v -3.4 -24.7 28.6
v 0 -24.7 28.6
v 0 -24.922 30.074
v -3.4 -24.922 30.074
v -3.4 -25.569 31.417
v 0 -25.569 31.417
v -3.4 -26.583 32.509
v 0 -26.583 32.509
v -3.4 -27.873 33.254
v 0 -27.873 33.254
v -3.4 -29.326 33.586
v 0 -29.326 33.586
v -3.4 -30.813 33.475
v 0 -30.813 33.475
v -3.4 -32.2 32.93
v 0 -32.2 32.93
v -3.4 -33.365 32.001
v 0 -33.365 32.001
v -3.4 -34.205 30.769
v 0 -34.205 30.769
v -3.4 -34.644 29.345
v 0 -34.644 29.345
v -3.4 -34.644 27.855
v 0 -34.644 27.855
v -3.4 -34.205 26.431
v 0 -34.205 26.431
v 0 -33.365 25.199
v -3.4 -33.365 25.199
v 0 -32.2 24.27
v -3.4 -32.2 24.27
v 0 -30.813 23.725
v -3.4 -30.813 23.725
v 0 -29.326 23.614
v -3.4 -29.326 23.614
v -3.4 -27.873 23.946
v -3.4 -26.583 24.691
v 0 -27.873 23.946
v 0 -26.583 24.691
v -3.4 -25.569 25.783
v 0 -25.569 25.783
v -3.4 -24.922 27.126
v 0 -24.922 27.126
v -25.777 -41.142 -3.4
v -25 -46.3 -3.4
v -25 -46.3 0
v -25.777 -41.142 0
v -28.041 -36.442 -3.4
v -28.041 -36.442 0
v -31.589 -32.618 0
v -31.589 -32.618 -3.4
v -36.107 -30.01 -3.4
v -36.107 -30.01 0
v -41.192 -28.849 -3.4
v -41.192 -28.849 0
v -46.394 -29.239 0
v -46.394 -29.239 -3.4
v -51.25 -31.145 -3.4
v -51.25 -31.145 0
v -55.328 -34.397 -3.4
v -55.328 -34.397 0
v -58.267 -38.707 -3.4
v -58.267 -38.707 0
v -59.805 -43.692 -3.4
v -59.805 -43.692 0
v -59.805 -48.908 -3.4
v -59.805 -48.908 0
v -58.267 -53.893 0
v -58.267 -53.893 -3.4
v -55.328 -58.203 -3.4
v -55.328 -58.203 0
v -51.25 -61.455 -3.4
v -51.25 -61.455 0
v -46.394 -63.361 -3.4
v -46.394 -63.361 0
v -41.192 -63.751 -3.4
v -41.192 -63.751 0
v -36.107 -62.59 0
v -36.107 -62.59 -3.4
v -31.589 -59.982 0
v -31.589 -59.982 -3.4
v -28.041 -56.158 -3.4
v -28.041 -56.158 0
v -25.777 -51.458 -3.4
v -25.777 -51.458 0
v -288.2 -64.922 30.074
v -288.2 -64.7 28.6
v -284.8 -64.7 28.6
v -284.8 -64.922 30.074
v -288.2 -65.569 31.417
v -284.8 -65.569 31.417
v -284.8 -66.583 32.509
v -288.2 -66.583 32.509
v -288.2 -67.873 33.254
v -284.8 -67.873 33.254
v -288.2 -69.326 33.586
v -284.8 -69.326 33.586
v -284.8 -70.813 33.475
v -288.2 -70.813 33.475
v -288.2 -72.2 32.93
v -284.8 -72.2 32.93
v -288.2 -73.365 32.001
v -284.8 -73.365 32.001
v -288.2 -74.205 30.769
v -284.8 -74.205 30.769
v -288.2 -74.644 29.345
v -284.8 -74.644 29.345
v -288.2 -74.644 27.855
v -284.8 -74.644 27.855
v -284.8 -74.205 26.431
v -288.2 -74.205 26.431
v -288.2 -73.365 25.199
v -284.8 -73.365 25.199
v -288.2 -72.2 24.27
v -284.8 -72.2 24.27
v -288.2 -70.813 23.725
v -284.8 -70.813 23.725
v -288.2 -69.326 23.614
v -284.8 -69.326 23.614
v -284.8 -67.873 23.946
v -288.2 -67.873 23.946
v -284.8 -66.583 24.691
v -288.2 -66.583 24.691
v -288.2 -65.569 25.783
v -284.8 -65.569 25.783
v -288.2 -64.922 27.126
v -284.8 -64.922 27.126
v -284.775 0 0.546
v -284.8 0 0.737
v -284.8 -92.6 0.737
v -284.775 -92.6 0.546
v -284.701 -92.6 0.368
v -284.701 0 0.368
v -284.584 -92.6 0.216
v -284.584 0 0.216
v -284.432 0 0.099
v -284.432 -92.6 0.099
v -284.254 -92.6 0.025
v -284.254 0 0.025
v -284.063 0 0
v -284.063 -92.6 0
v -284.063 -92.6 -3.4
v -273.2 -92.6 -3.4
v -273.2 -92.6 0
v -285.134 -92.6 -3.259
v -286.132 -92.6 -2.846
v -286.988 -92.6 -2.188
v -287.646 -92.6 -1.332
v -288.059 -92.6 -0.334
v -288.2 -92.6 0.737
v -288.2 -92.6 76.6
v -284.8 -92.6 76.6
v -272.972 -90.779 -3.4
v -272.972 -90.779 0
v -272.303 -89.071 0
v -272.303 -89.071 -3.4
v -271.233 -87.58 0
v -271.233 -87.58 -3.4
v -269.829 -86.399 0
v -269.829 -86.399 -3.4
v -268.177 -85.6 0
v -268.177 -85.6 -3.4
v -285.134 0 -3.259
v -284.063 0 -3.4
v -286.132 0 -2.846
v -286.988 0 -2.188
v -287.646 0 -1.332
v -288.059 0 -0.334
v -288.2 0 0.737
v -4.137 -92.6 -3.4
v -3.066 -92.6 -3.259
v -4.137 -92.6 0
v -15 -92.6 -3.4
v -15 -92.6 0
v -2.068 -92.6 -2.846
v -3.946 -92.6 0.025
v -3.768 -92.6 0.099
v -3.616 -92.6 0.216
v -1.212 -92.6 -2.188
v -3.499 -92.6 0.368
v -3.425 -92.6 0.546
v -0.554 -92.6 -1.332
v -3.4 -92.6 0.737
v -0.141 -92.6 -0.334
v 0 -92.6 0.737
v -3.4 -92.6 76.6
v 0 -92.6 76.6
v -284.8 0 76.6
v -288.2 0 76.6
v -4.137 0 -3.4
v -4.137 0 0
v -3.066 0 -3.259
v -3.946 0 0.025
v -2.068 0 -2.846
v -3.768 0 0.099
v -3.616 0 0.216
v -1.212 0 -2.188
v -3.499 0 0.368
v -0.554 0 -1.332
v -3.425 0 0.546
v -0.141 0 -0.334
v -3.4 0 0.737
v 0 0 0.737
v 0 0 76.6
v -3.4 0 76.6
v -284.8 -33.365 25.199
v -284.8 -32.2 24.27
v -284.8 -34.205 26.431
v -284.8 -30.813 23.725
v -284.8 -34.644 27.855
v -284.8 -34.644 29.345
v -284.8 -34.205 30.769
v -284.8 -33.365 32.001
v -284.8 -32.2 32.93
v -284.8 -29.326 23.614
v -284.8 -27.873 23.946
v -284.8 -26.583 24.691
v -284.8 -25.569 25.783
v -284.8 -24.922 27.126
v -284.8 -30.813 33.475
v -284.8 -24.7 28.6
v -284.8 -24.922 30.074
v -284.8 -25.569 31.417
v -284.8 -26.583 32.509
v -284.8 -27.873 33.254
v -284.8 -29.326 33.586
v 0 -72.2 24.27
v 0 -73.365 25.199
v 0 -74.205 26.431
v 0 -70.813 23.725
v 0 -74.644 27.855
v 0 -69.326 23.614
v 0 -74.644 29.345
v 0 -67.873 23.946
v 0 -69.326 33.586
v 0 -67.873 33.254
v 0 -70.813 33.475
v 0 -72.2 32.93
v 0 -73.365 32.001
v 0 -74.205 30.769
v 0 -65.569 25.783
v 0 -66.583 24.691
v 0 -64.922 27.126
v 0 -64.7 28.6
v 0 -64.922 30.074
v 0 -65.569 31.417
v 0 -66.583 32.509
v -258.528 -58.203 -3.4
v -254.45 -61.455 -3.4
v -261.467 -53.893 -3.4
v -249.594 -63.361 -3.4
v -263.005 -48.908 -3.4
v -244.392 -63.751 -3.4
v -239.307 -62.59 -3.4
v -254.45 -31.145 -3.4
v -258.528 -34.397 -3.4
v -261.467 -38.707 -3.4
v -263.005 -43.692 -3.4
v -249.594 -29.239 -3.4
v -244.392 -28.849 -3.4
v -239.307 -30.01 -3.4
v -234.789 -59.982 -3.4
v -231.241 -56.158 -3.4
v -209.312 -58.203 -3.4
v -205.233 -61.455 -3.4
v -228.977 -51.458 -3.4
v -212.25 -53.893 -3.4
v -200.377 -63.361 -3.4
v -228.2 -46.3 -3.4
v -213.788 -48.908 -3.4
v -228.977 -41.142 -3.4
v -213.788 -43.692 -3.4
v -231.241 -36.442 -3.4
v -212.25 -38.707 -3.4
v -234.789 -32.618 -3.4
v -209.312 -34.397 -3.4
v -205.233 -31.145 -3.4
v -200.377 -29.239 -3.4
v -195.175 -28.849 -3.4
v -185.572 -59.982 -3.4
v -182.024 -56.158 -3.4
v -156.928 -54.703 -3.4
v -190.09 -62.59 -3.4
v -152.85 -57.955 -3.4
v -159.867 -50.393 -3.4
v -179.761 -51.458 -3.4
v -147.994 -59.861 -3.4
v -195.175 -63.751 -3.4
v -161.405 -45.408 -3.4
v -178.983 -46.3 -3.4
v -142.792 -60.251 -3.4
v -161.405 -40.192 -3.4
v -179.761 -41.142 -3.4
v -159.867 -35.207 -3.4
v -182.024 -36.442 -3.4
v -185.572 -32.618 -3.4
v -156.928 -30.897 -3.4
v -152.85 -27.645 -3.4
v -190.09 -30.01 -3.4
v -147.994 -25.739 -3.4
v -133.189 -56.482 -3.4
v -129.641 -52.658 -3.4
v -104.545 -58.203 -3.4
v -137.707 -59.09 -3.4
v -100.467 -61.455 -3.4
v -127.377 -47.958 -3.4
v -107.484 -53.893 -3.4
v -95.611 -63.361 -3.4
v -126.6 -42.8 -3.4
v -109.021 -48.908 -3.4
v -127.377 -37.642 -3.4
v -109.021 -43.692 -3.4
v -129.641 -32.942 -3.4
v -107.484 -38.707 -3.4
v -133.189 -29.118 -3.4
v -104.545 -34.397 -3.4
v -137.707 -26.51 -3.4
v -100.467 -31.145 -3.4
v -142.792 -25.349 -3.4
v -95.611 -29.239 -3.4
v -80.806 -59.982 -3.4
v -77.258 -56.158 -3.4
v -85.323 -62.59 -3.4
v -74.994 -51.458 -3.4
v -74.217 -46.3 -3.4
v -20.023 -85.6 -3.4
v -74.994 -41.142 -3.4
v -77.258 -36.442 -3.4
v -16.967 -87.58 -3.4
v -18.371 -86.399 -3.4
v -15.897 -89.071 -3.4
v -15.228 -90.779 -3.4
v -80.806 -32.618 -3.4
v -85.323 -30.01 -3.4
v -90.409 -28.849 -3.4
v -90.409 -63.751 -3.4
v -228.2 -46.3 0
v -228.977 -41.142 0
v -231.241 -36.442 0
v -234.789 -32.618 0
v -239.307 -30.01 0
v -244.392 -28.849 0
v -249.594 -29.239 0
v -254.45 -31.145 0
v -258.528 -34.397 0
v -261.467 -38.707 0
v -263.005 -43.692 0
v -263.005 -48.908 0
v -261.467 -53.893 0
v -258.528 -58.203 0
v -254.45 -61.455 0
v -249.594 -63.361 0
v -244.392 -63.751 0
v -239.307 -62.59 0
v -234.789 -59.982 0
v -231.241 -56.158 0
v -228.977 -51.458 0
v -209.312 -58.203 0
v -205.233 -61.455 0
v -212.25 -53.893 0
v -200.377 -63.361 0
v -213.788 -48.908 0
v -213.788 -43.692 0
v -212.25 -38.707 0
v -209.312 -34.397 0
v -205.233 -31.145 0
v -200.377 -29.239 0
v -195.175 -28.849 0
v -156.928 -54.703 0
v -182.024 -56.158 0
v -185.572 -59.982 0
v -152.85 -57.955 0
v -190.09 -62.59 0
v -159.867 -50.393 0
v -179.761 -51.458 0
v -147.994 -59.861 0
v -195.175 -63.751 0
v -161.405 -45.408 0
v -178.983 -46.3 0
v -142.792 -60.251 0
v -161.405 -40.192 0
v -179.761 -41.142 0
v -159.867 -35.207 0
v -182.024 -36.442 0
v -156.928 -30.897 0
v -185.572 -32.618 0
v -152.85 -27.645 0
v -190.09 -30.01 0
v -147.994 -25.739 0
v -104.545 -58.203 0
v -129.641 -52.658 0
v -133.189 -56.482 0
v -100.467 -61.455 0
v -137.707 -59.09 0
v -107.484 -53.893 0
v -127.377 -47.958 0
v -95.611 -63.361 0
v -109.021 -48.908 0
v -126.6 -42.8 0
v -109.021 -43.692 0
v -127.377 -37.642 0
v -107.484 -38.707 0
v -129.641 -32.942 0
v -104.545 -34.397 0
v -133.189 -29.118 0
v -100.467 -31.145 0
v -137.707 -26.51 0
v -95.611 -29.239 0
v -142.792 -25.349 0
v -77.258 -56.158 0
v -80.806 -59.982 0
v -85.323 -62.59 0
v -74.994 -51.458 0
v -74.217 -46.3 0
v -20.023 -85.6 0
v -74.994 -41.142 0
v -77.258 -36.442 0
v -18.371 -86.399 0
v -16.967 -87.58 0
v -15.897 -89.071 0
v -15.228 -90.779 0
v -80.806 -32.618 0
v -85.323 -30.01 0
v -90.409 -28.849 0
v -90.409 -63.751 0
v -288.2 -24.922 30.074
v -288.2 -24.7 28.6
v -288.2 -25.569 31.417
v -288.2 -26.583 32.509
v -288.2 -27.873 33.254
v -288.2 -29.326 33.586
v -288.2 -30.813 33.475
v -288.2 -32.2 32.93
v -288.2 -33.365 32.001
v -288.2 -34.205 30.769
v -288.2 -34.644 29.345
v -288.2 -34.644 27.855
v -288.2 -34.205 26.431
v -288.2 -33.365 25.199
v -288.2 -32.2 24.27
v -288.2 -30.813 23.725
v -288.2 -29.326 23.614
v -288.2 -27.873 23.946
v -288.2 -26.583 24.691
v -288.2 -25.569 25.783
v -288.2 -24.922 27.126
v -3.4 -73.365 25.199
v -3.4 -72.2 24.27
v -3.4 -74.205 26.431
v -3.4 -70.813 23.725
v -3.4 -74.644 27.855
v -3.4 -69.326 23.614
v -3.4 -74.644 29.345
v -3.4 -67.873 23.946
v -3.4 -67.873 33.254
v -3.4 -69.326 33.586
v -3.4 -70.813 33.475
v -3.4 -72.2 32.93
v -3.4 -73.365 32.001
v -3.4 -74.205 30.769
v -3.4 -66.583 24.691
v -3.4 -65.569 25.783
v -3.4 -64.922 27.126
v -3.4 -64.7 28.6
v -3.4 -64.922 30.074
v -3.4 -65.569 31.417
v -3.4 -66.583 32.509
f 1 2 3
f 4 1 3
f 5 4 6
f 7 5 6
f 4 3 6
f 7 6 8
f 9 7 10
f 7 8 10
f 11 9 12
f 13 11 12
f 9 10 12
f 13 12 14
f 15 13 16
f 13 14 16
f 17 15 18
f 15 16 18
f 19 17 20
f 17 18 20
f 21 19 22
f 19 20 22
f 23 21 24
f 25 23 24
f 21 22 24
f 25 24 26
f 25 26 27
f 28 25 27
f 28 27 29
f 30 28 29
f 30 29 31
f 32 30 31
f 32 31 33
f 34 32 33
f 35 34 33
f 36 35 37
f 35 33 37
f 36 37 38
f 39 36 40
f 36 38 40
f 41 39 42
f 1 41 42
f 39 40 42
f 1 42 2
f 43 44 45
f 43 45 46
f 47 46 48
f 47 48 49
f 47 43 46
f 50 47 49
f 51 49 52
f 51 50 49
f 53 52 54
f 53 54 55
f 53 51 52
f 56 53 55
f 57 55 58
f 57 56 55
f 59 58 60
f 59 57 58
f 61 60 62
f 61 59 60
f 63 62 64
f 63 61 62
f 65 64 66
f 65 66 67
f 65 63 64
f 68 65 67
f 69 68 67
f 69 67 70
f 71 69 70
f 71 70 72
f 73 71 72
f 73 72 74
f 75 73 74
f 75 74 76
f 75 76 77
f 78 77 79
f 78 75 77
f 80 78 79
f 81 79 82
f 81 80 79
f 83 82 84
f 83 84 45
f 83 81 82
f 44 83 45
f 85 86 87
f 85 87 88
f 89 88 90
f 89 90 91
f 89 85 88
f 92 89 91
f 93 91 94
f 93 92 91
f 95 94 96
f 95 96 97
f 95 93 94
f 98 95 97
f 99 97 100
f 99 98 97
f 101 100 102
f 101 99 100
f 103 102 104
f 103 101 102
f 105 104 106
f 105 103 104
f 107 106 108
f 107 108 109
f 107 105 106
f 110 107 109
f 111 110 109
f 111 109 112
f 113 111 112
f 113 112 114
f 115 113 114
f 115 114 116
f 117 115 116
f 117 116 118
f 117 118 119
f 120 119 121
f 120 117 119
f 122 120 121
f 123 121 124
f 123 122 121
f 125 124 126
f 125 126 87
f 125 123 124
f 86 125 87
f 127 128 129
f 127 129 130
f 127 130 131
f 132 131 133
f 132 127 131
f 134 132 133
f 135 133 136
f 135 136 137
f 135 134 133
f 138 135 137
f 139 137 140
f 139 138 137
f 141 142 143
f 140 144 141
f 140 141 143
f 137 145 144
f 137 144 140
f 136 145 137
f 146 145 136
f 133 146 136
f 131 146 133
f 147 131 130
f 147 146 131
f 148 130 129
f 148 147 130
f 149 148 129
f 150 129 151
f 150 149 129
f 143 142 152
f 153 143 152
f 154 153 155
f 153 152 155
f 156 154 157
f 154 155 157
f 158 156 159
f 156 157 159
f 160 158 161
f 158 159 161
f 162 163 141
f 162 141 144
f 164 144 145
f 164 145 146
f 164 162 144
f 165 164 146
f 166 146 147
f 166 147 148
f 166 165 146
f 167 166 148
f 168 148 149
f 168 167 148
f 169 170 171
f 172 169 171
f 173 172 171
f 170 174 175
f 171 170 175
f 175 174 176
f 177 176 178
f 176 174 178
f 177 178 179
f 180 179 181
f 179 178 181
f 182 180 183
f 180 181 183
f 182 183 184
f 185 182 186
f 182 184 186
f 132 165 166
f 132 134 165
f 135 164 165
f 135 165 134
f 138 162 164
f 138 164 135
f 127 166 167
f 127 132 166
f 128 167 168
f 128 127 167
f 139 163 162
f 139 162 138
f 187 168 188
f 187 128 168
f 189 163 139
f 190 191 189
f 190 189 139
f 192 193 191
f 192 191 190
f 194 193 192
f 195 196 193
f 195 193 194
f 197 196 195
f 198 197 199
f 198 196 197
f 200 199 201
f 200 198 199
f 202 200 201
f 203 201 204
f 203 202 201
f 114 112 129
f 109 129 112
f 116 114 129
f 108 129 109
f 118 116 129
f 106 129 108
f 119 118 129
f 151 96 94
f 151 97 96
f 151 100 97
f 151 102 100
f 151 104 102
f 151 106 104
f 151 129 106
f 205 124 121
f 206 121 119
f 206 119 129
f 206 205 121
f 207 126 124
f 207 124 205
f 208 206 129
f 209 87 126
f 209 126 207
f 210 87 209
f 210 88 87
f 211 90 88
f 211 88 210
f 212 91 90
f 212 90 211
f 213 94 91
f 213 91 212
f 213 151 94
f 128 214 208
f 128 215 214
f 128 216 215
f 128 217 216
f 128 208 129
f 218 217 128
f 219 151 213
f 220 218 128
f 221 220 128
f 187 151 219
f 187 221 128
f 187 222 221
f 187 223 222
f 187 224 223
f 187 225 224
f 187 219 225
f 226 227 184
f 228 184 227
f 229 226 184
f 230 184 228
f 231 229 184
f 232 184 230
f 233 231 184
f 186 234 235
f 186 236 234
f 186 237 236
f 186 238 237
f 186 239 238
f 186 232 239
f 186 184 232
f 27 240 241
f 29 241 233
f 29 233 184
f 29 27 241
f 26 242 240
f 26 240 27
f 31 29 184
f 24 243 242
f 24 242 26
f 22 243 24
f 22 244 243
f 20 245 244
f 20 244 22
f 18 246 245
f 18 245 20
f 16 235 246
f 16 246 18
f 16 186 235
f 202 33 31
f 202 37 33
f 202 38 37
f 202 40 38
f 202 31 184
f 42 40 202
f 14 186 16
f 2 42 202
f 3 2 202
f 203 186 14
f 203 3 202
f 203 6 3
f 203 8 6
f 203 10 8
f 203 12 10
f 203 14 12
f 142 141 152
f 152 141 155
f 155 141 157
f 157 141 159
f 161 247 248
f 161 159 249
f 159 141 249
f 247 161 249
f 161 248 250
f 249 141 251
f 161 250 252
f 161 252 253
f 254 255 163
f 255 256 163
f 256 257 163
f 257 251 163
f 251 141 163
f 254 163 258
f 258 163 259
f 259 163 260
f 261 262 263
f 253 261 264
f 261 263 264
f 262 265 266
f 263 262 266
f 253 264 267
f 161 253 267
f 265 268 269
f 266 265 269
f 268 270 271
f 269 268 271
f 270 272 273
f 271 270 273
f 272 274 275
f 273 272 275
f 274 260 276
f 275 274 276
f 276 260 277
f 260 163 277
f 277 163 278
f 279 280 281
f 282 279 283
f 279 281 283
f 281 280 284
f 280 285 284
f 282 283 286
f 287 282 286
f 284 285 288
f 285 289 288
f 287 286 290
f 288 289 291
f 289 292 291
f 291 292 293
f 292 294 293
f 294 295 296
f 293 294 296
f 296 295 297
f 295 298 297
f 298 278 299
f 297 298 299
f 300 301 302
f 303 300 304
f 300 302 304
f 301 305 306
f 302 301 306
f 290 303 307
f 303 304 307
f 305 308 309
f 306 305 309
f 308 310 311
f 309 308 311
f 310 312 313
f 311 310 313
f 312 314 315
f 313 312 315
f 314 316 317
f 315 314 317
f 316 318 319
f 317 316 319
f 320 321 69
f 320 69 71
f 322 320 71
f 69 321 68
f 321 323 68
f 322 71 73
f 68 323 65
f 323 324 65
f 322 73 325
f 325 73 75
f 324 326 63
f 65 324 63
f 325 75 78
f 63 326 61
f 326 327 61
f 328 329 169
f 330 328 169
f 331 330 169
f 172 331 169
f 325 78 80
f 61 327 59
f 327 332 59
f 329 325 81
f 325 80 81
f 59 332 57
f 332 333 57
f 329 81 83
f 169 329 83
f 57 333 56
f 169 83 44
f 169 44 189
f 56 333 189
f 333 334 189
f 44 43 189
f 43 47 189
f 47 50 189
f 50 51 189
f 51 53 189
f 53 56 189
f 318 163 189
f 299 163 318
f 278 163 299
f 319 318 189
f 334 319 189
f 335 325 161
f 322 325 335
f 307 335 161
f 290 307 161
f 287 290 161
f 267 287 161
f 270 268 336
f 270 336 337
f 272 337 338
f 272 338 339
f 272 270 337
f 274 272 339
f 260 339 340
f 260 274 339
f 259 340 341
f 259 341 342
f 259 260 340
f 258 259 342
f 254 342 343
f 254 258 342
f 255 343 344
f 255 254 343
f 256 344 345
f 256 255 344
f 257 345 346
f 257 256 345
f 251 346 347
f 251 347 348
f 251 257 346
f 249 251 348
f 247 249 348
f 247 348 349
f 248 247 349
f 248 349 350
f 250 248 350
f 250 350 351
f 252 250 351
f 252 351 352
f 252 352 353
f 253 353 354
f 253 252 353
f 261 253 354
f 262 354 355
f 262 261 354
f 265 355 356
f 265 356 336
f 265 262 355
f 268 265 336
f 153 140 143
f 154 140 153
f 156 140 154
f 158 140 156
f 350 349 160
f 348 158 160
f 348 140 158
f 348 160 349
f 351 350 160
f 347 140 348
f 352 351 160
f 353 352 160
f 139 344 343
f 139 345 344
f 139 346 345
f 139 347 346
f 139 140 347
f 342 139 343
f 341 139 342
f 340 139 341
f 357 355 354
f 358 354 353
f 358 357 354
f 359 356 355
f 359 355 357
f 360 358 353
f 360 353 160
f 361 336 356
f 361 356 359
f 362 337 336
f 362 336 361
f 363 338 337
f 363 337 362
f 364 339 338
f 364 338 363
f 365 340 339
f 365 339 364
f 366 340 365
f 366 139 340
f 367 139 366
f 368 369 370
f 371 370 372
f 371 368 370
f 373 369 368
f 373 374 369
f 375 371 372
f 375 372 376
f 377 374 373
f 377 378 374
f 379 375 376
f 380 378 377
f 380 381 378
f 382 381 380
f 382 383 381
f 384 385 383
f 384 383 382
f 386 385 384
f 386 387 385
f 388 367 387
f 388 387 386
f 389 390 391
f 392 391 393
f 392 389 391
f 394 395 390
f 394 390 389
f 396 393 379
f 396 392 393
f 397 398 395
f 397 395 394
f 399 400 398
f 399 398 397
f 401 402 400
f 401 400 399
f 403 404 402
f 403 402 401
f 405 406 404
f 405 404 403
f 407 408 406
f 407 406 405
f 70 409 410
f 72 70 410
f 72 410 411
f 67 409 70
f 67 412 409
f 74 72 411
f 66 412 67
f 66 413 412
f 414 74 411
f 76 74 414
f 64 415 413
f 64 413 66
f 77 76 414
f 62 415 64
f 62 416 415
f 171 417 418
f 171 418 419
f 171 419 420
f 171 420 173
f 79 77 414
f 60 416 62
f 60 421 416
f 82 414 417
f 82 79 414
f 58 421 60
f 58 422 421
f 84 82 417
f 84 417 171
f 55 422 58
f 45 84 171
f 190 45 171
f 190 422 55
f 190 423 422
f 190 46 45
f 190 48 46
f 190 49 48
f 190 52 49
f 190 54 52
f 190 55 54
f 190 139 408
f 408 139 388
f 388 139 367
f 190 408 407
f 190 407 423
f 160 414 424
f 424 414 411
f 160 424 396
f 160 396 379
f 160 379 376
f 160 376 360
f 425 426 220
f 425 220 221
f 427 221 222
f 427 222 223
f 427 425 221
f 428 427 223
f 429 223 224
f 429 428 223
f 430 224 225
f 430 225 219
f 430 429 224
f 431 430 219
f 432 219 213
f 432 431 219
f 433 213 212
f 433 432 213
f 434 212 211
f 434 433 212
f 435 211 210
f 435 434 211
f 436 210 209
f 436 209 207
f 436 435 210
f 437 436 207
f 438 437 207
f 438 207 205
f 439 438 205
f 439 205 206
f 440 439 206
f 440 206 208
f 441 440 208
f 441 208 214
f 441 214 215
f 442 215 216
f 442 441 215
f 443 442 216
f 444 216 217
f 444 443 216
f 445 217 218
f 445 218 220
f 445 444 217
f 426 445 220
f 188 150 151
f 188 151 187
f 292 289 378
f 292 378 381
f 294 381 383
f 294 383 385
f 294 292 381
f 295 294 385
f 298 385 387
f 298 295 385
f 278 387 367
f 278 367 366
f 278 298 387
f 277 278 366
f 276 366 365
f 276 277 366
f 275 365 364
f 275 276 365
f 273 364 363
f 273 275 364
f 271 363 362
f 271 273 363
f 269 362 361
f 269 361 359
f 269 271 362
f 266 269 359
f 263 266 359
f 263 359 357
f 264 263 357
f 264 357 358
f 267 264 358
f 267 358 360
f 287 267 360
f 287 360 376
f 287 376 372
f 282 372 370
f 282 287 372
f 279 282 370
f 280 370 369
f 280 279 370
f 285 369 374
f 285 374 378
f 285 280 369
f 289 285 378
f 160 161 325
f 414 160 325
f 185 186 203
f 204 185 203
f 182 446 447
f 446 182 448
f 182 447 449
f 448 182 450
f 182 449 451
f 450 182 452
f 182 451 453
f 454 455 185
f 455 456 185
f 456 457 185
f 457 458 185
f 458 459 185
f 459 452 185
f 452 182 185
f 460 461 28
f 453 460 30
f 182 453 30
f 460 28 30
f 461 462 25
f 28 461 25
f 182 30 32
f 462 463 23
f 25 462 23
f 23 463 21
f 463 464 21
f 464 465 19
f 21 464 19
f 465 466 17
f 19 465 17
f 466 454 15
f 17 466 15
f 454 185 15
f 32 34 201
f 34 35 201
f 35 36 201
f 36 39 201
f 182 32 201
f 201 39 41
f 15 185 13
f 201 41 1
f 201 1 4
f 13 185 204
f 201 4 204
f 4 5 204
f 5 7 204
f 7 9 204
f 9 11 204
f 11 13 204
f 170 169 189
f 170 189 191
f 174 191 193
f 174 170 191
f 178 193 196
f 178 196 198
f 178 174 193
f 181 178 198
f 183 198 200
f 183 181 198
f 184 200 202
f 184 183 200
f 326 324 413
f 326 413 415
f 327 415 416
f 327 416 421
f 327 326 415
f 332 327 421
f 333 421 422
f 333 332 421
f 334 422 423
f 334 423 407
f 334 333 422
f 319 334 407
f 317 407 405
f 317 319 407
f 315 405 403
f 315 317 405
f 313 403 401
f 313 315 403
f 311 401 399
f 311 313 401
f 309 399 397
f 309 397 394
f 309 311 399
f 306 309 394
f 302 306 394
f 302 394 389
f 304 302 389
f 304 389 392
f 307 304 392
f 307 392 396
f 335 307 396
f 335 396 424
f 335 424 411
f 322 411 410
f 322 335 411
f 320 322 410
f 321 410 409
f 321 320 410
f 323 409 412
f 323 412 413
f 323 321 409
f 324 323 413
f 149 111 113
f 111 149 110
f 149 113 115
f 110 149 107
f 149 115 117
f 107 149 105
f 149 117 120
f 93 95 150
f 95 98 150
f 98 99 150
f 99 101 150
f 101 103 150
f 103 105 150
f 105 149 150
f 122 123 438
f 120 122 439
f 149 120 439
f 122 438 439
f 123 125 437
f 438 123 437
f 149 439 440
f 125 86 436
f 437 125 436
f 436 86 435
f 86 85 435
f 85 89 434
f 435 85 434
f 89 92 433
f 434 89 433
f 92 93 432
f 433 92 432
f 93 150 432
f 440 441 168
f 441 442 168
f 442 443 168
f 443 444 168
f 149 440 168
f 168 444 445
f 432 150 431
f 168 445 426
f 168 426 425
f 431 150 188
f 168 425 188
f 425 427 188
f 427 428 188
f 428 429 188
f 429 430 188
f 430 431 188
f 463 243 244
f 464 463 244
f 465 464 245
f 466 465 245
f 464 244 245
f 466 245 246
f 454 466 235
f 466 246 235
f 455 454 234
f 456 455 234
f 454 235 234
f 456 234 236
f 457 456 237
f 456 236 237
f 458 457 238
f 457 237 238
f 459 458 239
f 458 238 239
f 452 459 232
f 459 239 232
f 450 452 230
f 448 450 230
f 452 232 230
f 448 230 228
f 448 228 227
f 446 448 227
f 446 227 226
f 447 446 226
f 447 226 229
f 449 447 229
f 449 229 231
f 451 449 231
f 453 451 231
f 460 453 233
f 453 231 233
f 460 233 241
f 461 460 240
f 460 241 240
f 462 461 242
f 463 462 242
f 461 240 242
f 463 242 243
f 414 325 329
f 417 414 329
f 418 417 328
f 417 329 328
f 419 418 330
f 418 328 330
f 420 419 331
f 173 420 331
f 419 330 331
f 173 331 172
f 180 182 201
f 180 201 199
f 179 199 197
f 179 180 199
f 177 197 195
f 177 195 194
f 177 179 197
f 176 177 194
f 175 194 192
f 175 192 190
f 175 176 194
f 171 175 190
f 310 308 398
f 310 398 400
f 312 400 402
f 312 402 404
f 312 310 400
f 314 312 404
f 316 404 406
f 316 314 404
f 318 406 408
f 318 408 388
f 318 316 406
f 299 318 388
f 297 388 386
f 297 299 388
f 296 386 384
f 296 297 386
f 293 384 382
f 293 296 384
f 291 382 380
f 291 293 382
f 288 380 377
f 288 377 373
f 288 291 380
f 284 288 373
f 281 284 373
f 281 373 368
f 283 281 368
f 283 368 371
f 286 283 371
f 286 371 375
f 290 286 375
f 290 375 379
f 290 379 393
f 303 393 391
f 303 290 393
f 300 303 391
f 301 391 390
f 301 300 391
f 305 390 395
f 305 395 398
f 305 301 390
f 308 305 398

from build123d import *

# Parameters (mm, degrees)
BASE_FLANGE1_START           = -3.4
BASE_FLANGE1_OUTLINE_R       = 17.5
BASE_FLANGE1_DEPTH           = 3.4
EDGE_FLANGE2_STRIP_W         = 15.0732
EDGE_FLANGE2_STRIP_H         = 3.4
EDGE_FLANGE2_STRIP_CUT_DEPTH = 92.6
EDGE_FLANGE2_DEPTH           = 92.6
EDGE_FLANGE2_PROFILE_W       = 92.6
EDGE_FLANGE2_PROFILE_H       = 75.8634
EDGE_FLANGE2_PROFILE_R       = 5
EDGE_FLANGE2_FLAT_DEPTH      = 3.4
EDGE_FLANGE3_STRIP_W         = 15.0732
EDGE_FLANGE3_STRIP_H         = 3.4
EDGE_FLANGE3_STRIP_CUT_DEPTH = 92.6
EDGE_FLANGE3_DEPTH           = 92.6
EDGE_FLANGE3_PROFILE_W       = 92.6
EDGE_FLANGE3_PROFILE_H       = 75.8634
EDGE_FLANGE3_PROFILE_R       = 5
EDGE_FLANGE3_FLAT_DEPTH      = 3.4


# Read off the part's stored shape, not the designer's step: Base-Flange1
# Sheet-metal steps are written as plain solids
with BuildPart() as part:
    # Base-Flange1 outline → Base-Flange1 (new body)
    with BuildSketch(Plane.XY.offset(BASE_FLANGE1_START)):
        with BuildLine():
            Line((0, -92.6), (0, 0))
            Line((0, 0), (-288.2, 0))
            Line((-288.2, 0), (-288.2, -92.6))
            Line((-288.2, -92.6), (-273.2, -92.6))
            ThreePointArc((-273.2, -92.6), (-271.814311921, -88.29213457), (-268.176971207, -85.6))
            Line((-268.176971207, -85.6), (-20.023028793, -85.6))
            ThreePointArc((-20.023028793, -85.6), (-16.385688079, -88.29213457), (-15, -92.6))
            Line((-15, -92.6), (0, -92.6))
        make_face()
        with Locations((-245.7, -46.3)):
            Circle(BASE_FLANGE1_OUTLINE_R, mode=Mode.SUBTRACT)
        with Locations((-196.483203415, -46.3)):
            Circle(BASE_FLANGE1_OUTLINE_R, mode=Mode.SUBTRACT)
        with Locations((-144.1, -42.8)):
            Circle(BASE_FLANGE1_OUTLINE_R, mode=Mode.SUBTRACT)
        with Locations((-91.716796585, -46.3)):
            Circle(BASE_FLANGE1_OUTLINE_R, mode=Mode.SUBTRACT)
        with Locations((-42.5, -46.3)):
            Circle(BASE_FLANGE1_OUTLINE_R, mode=Mode.SUBTRACT)
    extrude(amount=BASE_FLANGE1_DEPTH)

    # Edge-Flange2 strip (across the edge) → Edge-Flange2 strip cut (cut)
    with BuildSketch(Plane(origin=(-288.2, 0, 0), x_dir=(1, 0, 0), z_dir=(0, -1, 0))):
        with Locations((-3.4, -1.7)):
            Rectangle(EDGE_FLANGE2_STRIP_W, EDGE_FLANGE2_STRIP_H)
    extrude(amount=EDGE_FLANGE2_STRIP_CUT_DEPTH, mode=Mode.SUBTRACT)

    # Edge-Flange2 bend section (across the edge) → Edge-Flange2 (add)
    with BuildSketch(Plane(origin=(-288.2, 0, 0), x_dir=(1, 0, 0), z_dir=(0, -1, 0))):
        with BuildLine():
            Line((0, 0.7366), (3.4, 0.7366))
            ThreePointArc((3.4, 0.7366), (3.615745145, 0.215745145), (4.1366, 0))
            Line((4.1366, 0), (4.1366, -3.4))
            ThreePointArc((4.1366, -3.4), (1.211582089, -2.188417911), (0, 0.7366))
        make_face()
    extrude(amount=EDGE_FLANGE2_DEPTH)

    # Edge-Flange2 profile (on flange) → Edge-Flange2 flat (add)
    with BuildSketch(Plane.YZ.offset(-288.2)):
        with Locations((-46.3, 38.6683)):
            Rectangle(EDGE_FLANGE2_PROFILE_W, EDGE_FLANGE2_PROFILE_H)
        with Locations((-29.7, 28.6)):
            Circle(EDGE_FLANGE2_PROFILE_R, mode=Mode.SUBTRACT)
        with Locations((-69.7, 28.6)):
            Circle(EDGE_FLANGE2_PROFILE_R, mode=Mode.SUBTRACT)
    extrude(amount=EDGE_FLANGE2_FLAT_DEPTH)

    # Edge-Flange3 strip (across the edge) → Edge-Flange3 strip cut (cut)
    with BuildSketch(Plane(origin=(0, -92.6, 0), x_dir=(-1, 0, 0), z_dir=(0, 1, 0))):
        with Locations((-3.4, -1.7)):
            Rectangle(EDGE_FLANGE3_STRIP_W, EDGE_FLANGE3_STRIP_H)
    extrude(amount=EDGE_FLANGE3_STRIP_CUT_DEPTH, mode=Mode.SUBTRACT)

    # Edge-Flange3 bend section (across the edge) → Edge-Flange3 (add)
    with BuildSketch(Plane(origin=(0, -92.6, 0), x_dir=(-1, 0, 0), z_dir=(0, 1, 0))):
        with BuildLine():
            Line((0, 0.7366), (3.4, 0.7366))
            ThreePointArc((3.4, 0.7366), (3.615745145, 0.215745145), (4.1366, 0))
            Line((4.1366, 0), (4.1366, -3.4))
            ThreePointArc((4.1366, -3.4), (1.211582089, -2.188417911), (0, 0.7366))
        make_face()
    extrude(amount=EDGE_FLANGE3_DEPTH)

    # Edge-Flange3 profile (on flange) → Edge-Flange3 flat (add)
    with BuildSketch(Plane.YZ):
        with Locations((-46.3, 38.6683)):
            Rectangle(EDGE_FLANGE3_PROFILE_W, EDGE_FLANGE3_PROFILE_H)
        with Locations((-69.7, 28.6)):
            Circle(EDGE_FLANGE3_PROFILE_R, mode=Mode.SUBTRACT)
        with Locations((-29.7, 28.6)):
            Circle(EDGE_FLANGE3_PROFILE_R, mode=Mode.SUBTRACT)
    extrude(amount=-EDGE_FLANGE3_FLAT_DEPTH)


solid = part.part
